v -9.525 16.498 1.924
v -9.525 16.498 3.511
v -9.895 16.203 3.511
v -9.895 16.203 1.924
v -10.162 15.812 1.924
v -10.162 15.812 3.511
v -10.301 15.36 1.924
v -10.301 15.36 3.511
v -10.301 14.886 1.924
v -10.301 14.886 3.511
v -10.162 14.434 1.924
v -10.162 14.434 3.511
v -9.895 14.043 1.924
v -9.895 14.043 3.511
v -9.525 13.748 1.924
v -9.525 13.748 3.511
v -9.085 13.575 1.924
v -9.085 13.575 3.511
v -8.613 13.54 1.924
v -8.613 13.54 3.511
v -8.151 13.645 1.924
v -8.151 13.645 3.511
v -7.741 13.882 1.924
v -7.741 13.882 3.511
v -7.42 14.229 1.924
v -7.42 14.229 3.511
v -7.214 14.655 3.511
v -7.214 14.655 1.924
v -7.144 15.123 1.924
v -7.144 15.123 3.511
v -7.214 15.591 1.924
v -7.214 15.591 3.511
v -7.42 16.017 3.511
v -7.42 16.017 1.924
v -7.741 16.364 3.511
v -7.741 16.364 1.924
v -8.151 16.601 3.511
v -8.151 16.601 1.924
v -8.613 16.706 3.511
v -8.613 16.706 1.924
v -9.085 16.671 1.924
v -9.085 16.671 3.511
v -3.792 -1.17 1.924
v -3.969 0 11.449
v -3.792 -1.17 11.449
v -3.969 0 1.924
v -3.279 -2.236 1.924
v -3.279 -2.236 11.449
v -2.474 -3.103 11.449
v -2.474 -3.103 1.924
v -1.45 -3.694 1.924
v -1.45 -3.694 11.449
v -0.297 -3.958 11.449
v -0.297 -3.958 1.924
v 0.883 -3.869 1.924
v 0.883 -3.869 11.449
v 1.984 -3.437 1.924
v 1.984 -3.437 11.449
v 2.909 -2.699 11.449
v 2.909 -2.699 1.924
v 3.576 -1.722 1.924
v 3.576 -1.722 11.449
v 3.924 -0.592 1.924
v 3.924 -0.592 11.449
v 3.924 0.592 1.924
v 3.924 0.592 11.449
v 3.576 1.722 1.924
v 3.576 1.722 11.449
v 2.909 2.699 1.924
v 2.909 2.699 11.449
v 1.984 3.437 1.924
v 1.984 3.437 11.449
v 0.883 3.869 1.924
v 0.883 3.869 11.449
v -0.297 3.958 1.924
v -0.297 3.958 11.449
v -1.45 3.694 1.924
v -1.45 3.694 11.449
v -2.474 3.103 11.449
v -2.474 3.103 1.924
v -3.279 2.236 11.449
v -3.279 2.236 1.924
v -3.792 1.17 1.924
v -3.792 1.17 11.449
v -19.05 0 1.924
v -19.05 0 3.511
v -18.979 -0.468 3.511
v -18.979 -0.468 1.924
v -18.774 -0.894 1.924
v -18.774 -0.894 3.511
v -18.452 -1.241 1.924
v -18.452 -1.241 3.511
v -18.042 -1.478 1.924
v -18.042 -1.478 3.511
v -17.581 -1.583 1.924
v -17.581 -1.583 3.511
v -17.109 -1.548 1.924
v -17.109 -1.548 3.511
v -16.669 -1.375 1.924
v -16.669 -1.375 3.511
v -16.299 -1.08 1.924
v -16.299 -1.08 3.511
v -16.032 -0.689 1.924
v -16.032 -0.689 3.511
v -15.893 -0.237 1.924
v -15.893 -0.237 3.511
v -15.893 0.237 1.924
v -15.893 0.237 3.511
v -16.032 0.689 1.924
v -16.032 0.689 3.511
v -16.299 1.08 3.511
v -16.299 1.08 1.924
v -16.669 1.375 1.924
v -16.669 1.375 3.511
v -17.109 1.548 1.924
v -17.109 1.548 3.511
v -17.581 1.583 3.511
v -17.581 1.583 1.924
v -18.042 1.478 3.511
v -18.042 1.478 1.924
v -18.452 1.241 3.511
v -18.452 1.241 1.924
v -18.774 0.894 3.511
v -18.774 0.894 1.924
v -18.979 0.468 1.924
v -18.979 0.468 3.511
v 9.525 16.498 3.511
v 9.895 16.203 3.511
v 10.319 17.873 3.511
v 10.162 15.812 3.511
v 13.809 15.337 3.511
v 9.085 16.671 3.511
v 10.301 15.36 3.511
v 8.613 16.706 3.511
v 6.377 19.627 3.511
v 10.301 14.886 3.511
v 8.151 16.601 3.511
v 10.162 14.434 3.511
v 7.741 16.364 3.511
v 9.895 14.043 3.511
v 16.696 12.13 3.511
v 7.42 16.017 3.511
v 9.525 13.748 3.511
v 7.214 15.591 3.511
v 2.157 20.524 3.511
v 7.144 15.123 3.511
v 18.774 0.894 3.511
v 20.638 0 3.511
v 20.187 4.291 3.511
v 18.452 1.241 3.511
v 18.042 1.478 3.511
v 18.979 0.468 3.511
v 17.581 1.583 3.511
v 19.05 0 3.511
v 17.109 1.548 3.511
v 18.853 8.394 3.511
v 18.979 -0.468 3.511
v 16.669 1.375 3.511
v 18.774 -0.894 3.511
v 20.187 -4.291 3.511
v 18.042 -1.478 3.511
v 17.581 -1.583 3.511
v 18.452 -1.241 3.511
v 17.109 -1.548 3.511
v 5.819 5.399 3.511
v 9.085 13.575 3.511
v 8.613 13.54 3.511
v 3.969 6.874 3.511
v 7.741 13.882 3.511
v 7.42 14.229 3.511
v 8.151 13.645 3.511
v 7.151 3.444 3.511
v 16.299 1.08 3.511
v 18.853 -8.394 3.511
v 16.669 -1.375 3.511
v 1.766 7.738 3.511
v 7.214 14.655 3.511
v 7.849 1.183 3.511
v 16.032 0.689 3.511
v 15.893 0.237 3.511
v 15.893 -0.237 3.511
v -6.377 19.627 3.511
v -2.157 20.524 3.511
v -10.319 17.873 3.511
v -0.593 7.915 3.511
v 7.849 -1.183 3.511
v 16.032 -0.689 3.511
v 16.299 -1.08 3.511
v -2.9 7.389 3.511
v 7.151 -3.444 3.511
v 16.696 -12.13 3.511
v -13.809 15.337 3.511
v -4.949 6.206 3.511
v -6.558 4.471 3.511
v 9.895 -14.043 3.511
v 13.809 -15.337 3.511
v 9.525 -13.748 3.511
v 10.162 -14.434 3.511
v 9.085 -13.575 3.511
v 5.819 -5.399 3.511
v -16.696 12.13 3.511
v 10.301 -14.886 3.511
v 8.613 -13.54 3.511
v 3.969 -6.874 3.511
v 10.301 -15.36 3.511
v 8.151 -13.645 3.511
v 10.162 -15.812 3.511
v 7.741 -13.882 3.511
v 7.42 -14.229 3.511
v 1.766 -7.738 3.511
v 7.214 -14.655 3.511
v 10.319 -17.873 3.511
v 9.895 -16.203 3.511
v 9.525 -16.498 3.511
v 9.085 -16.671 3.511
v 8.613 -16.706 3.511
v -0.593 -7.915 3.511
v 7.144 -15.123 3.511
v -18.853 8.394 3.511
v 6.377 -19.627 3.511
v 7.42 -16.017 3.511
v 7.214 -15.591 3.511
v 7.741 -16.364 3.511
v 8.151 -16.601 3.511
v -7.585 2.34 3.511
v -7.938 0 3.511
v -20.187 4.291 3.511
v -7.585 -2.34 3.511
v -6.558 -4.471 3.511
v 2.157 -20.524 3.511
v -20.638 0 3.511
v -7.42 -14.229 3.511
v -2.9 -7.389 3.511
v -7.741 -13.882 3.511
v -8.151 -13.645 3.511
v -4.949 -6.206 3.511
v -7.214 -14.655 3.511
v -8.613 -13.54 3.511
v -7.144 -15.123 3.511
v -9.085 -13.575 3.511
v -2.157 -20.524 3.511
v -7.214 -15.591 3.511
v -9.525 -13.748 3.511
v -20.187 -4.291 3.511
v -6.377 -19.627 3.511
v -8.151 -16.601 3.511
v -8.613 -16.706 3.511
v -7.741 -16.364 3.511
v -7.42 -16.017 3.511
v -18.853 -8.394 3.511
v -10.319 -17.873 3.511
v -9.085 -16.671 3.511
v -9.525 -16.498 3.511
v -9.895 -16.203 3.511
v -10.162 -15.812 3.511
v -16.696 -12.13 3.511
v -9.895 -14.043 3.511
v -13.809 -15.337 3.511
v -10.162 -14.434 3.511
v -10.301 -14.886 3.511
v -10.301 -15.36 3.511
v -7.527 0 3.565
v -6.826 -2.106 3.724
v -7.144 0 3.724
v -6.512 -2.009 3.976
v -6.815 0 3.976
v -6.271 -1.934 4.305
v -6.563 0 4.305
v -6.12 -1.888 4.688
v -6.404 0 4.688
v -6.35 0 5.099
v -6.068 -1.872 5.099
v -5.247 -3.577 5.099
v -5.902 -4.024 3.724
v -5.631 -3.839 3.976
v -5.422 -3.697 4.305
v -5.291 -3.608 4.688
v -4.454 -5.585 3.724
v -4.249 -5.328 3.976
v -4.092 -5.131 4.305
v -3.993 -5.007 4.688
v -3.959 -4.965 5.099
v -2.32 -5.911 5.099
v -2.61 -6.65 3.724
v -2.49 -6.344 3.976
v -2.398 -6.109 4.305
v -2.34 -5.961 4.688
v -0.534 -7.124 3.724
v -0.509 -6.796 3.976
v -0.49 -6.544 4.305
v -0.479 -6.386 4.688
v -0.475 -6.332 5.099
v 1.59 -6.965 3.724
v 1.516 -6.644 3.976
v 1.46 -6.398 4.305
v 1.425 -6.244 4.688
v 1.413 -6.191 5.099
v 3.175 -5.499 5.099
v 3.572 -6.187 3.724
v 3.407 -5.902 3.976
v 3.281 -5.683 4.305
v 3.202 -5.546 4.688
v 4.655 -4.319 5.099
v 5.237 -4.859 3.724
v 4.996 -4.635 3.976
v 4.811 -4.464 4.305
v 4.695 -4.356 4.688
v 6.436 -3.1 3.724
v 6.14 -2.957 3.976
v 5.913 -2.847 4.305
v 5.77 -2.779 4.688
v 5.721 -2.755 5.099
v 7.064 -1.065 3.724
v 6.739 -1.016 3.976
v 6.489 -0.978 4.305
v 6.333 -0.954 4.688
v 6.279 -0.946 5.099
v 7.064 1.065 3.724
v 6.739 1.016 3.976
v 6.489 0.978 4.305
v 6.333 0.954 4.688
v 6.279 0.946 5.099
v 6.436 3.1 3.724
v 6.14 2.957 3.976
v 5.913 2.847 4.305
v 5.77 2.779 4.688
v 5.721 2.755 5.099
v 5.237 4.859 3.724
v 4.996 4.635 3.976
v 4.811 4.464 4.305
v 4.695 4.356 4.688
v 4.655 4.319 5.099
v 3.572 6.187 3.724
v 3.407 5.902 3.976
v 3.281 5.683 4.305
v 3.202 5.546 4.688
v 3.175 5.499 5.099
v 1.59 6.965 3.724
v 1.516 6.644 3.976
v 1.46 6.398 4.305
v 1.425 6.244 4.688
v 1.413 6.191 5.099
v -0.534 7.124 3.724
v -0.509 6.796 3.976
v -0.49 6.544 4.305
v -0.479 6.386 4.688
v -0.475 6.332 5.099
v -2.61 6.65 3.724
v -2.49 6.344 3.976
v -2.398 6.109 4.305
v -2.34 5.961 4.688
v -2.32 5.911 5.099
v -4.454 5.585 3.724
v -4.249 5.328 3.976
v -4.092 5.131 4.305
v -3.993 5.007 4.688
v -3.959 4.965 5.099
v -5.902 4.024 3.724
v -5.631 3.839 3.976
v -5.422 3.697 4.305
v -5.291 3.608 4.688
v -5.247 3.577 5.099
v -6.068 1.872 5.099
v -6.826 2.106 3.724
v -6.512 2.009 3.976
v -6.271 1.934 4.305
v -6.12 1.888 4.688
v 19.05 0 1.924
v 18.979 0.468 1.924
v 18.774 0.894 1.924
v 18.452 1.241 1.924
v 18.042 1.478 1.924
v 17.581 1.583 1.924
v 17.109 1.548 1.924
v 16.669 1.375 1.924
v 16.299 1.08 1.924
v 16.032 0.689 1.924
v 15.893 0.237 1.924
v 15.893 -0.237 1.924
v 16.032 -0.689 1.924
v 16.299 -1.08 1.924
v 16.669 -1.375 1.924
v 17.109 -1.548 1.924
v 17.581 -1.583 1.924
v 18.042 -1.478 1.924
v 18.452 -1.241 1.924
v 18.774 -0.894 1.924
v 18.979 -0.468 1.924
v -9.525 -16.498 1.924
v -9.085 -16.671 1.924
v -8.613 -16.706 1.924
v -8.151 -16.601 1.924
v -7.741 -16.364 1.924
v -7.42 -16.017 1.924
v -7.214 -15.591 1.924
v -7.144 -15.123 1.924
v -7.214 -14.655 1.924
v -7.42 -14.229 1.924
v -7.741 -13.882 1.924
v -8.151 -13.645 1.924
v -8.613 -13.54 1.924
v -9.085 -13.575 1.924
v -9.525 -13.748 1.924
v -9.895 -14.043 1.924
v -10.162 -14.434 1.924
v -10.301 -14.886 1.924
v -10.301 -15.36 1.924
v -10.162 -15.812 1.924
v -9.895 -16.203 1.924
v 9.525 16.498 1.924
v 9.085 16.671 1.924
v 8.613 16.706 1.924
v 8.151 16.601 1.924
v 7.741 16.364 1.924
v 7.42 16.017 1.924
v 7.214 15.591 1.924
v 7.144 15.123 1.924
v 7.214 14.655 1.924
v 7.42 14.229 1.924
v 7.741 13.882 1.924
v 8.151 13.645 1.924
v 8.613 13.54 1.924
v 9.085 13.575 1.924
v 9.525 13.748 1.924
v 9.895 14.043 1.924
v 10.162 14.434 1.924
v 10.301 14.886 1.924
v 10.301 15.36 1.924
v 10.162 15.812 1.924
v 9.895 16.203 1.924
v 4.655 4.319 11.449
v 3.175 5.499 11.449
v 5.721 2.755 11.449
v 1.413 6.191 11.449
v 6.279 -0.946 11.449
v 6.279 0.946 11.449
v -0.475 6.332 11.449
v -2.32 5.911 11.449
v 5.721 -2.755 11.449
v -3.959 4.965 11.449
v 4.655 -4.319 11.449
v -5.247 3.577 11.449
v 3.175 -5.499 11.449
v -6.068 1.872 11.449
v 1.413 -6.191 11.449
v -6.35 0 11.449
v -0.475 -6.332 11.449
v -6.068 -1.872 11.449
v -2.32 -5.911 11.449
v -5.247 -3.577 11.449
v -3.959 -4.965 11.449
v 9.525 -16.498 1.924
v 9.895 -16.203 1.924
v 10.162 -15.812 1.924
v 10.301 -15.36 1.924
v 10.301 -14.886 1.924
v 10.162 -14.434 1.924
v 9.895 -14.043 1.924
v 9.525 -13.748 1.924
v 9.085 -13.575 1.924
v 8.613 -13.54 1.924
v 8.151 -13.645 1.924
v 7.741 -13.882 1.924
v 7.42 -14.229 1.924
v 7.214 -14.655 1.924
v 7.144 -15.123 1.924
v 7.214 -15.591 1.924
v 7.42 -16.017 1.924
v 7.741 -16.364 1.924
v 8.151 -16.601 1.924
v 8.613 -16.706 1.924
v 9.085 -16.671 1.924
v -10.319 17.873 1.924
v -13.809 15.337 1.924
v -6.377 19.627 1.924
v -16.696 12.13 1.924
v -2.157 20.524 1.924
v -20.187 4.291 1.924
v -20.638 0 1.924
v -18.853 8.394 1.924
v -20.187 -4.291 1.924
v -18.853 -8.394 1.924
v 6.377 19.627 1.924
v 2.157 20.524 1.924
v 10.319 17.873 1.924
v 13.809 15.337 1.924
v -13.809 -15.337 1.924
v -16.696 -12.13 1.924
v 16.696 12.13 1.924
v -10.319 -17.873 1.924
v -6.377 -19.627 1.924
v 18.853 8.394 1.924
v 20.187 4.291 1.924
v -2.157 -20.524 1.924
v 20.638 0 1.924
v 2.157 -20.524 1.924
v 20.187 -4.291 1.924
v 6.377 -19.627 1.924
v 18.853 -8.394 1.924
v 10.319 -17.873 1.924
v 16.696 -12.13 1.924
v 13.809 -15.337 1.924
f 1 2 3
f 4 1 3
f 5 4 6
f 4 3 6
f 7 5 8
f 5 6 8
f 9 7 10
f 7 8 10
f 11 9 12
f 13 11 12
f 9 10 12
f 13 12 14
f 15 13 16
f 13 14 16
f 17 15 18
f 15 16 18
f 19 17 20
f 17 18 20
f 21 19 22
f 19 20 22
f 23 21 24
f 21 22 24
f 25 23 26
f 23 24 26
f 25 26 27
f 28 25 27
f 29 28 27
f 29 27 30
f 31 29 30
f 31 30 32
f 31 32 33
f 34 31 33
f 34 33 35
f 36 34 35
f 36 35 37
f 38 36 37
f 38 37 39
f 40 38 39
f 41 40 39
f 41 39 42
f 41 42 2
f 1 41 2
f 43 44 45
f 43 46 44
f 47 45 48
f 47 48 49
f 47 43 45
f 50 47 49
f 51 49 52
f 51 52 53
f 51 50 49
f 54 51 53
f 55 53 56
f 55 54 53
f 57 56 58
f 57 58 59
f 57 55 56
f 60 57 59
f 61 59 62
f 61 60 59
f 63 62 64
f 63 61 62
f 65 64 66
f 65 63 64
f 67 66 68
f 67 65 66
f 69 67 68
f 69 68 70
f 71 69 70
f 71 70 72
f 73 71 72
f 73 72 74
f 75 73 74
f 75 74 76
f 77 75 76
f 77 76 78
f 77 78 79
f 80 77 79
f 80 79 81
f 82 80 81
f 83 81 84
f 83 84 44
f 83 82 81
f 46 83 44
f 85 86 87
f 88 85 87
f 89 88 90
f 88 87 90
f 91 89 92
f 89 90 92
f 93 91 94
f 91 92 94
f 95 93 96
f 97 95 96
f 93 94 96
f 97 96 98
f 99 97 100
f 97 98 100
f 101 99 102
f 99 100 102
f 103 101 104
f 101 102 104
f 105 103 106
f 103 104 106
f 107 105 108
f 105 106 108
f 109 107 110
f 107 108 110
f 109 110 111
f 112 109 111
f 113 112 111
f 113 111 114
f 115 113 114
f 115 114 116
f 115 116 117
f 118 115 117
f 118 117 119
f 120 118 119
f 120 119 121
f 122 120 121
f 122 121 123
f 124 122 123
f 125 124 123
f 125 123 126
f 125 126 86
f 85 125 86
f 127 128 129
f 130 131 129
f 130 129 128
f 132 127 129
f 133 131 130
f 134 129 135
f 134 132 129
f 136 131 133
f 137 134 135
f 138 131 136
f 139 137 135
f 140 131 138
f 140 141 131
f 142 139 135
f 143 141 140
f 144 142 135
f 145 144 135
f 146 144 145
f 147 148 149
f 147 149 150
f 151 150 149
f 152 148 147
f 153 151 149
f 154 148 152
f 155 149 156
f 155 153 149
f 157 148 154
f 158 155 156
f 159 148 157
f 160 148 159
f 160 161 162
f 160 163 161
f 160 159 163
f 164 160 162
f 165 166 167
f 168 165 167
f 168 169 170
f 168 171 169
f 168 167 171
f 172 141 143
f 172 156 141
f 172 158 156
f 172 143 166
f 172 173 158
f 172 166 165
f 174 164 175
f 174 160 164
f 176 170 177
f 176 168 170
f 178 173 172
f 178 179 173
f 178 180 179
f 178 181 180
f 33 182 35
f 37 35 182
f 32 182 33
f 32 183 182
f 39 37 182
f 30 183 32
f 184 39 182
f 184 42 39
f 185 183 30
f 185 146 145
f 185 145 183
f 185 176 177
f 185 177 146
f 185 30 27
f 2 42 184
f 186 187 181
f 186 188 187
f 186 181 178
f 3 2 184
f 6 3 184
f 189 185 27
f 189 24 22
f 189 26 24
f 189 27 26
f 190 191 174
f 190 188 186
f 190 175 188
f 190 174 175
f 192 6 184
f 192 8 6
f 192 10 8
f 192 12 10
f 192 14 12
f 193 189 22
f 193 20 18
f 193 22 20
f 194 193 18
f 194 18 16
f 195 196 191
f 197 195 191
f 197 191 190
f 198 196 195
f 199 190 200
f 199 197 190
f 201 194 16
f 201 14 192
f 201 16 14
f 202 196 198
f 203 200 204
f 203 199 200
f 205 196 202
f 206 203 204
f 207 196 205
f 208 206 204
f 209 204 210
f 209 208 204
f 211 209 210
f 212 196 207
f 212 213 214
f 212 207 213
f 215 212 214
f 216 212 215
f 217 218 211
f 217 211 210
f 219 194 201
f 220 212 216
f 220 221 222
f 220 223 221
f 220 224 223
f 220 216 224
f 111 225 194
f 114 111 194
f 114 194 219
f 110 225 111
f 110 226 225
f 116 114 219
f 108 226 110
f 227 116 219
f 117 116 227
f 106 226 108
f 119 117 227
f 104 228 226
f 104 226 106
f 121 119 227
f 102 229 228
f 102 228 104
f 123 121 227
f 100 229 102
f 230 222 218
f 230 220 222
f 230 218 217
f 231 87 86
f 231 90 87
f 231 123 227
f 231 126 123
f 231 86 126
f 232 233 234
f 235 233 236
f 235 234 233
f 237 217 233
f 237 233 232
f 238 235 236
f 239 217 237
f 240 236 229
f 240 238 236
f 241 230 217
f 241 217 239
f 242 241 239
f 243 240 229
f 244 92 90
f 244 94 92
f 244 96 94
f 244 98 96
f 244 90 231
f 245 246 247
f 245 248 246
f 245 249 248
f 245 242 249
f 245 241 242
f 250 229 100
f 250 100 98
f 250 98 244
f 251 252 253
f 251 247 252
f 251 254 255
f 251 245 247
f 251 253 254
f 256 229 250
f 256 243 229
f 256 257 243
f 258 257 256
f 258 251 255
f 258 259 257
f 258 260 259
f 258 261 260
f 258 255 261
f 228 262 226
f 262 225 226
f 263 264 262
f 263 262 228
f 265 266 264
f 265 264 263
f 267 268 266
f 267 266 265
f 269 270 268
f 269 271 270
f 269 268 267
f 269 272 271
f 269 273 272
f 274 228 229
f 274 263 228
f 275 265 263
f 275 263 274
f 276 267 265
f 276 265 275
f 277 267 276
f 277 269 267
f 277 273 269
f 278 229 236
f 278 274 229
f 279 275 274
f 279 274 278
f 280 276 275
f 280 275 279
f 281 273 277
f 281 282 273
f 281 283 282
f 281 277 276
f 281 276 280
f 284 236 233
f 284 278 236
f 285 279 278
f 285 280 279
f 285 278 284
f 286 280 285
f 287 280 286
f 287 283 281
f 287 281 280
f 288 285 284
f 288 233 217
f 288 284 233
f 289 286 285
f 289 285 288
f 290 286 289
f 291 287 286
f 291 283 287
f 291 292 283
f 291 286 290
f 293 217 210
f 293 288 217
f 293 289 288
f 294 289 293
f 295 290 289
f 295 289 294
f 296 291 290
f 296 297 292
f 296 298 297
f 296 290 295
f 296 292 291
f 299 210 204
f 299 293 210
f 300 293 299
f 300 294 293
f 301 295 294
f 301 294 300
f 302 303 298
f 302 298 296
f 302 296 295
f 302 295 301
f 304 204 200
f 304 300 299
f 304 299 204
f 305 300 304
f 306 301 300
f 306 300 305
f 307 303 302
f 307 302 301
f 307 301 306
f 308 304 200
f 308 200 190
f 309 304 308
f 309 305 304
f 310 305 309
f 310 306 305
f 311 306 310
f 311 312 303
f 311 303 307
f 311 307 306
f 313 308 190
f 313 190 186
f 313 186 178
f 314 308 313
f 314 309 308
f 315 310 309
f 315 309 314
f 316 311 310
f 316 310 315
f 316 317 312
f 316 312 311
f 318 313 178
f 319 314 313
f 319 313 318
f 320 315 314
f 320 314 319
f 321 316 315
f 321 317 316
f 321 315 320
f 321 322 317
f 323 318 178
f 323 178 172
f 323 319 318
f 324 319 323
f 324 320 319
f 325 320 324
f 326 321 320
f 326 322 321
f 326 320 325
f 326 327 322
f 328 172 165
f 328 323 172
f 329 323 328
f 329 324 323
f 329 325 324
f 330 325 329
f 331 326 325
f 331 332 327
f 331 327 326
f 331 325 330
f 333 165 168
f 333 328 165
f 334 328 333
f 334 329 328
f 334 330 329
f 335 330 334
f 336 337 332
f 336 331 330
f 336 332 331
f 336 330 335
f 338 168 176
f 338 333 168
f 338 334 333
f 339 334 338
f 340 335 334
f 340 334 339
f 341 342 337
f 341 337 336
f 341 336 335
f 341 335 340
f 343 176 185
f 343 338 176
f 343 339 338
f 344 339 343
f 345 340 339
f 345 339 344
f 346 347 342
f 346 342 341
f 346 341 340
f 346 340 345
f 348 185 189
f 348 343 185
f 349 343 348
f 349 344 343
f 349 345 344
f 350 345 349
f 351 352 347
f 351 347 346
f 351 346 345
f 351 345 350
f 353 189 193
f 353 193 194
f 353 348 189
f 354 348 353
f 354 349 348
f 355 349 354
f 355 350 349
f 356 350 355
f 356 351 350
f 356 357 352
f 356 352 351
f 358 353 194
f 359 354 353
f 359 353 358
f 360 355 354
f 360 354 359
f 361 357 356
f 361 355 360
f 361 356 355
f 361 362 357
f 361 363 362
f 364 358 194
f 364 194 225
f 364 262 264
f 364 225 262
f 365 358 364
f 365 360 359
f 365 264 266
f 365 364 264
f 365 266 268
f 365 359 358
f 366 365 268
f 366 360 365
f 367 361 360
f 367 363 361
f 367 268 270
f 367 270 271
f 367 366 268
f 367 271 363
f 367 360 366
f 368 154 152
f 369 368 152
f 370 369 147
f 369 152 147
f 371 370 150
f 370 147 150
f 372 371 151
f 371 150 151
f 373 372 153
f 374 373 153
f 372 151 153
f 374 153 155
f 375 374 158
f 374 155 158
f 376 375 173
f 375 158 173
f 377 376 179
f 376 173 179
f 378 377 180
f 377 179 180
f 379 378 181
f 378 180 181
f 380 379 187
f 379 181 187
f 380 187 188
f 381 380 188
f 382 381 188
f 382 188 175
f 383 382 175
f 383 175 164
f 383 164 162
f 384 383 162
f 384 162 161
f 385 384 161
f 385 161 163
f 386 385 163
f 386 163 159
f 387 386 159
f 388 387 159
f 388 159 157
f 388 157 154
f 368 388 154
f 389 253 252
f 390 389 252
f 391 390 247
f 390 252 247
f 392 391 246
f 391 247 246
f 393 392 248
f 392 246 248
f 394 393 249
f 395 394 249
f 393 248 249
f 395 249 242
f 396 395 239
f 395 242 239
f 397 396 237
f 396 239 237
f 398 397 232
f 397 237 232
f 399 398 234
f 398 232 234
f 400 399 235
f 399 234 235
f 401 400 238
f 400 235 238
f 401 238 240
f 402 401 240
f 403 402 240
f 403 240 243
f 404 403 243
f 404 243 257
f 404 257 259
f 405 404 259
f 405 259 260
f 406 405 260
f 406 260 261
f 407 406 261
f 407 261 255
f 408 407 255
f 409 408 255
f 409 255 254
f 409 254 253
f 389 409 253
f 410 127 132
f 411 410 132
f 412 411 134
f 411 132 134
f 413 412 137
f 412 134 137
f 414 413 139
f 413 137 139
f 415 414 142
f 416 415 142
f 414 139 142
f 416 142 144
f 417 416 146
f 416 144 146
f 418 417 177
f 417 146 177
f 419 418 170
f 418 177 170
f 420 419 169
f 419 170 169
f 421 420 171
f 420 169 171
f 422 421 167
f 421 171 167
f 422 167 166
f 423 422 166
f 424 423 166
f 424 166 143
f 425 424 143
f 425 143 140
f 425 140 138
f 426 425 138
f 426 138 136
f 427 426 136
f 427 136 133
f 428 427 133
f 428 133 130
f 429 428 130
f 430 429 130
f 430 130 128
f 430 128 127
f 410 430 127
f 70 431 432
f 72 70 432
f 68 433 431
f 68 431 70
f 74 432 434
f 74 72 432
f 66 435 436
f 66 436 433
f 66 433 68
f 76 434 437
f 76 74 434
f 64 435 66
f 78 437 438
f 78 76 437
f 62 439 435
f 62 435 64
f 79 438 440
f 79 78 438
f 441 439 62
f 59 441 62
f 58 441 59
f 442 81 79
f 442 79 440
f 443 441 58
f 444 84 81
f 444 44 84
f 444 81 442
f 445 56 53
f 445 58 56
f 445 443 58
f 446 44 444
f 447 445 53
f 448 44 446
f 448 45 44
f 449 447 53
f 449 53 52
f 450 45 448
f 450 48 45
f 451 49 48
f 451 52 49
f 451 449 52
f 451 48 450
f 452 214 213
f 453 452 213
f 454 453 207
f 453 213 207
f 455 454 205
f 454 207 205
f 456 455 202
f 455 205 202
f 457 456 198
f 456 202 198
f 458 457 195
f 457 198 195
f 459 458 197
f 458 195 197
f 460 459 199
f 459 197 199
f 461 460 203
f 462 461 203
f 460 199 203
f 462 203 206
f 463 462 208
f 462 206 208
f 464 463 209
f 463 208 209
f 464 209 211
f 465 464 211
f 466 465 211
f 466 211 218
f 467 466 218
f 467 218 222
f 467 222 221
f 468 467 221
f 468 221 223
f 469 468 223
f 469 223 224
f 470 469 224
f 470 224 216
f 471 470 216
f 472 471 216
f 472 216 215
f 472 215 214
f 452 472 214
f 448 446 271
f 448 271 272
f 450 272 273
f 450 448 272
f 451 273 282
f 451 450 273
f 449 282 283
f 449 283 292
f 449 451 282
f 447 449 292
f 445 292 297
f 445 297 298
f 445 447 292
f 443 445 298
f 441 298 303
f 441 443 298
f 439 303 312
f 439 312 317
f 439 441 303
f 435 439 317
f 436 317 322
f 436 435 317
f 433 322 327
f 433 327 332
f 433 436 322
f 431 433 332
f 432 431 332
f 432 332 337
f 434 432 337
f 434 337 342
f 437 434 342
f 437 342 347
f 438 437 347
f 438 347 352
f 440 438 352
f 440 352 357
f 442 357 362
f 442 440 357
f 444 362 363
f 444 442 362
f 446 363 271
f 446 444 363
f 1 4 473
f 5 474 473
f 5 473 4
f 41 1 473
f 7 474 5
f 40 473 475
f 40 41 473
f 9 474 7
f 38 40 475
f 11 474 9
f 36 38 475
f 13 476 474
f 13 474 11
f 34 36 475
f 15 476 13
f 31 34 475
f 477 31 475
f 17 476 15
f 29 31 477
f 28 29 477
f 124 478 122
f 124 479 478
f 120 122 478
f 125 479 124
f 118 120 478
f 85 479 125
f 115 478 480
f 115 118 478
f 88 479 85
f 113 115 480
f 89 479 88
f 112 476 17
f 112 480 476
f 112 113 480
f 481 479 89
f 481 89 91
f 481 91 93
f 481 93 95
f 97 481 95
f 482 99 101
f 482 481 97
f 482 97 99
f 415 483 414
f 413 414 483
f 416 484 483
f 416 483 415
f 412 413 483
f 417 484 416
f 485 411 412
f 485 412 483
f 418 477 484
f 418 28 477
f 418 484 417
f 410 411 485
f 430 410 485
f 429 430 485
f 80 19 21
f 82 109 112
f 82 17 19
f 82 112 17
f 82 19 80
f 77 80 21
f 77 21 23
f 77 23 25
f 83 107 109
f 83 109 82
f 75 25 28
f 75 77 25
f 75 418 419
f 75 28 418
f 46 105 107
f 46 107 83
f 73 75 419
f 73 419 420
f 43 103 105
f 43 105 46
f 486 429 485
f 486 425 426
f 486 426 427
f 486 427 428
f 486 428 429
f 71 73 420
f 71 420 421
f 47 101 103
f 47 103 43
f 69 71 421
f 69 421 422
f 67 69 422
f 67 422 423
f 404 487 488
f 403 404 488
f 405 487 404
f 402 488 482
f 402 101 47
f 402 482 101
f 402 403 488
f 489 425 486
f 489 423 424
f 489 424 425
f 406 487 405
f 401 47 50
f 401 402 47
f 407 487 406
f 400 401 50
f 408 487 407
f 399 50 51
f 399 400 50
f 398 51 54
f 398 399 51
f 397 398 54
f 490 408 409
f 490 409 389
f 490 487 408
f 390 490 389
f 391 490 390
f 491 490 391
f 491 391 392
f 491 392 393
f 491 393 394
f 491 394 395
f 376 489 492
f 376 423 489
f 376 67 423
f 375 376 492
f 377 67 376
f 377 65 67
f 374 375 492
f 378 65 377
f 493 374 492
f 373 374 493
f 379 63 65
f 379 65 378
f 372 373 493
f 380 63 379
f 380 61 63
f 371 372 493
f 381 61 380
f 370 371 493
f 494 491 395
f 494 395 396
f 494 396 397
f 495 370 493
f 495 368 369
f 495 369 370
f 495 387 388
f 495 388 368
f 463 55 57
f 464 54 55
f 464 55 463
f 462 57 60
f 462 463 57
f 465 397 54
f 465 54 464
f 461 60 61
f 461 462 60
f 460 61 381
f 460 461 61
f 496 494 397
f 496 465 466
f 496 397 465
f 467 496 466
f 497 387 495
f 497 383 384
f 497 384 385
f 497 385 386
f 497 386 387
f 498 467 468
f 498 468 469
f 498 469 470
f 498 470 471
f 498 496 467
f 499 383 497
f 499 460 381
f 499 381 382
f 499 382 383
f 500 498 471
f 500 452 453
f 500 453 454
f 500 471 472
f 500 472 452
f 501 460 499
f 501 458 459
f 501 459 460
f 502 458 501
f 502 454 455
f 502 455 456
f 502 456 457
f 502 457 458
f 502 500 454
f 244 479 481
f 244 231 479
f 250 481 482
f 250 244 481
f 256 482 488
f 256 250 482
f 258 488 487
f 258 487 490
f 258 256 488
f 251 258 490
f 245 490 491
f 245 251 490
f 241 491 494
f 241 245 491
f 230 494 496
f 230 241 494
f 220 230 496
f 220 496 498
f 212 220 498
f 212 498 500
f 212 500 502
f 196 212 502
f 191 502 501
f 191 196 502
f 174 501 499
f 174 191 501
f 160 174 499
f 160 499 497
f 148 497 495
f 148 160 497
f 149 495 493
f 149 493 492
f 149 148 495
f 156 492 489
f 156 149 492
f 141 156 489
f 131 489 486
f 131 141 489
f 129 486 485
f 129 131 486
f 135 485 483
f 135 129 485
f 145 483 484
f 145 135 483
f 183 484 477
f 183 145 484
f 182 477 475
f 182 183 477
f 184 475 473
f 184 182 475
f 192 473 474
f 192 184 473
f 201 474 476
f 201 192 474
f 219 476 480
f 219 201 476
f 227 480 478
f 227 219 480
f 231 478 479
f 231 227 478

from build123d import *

# Parameters (mm, degrees)
FILLET1_R          = 3.175
SKETCH2_R          = 3.175
CUT_EXTRUDE1_DEPTH = 61.491874454
CIRPATTERN1_COUNT  = 6
SCALE1_SCALE       = 0.5


with BuildPart() as part:
    # Sketch1 → Revolve1 (revolve)
    with BuildSketch(Plane(origin=(0, 0, 0), x_dir=(0, 0, -1), z_dir=(1, 0, 0)), mode=Mode.PRIVATE) as revolve1_sk:
        Polygon((0, 7.9375), (0, 41.275), (-3.175, 41.275), (-3.175, 12.7), (-19.05, 12.7), (-19.05, 7.9375), align=None)
    revolve(revolve1_sk.sketch.rotate(Axis((0, 0, 0), (0, 0, 1)), 90), axis=Axis((0, 0, 0), (0, 0, 1)))

    # Fillet1
    fillet1_edges = [part.edges().sort_by_distance(p)[0] for p in [
        (12.7, 0, 3.175),
    ]]
    fillet(fillet1_edges, radius=FILLET1_R)

    # Sketch2 → Cut-Extrude1 (cut, through all)
    with BuildSketch(Plane.XY.offset(3.175)):
        with Locations((34.925, 0)):
            Circle(SKETCH2_R)
    cut_extrude1 = extrude(amount=-CUT_EXTRUDE1_DEPTH, mode=Mode.SUBTRACT)

    # CirPattern1: Cut-Extrude1 ×6 about axis
    cirpattern1_axis = Axis((0, 0, 0), (0, 0, 1))
    for i in range(1, CIRPATTERN1_COUNT):
        add(cut_extrude1.rotate(cirpattern1_axis, i * 360 / CIRPATTERN1_COUNT), mode=Mode.SUBTRACT)


with BuildPart() as part_1:
    # Scale1: scaled about (0, 0, 3.84726884)
    add(part.part.scale(SCALE1_SCALE).moved(Location((0, 0, 1.92363442))))


solid = part_1.part
